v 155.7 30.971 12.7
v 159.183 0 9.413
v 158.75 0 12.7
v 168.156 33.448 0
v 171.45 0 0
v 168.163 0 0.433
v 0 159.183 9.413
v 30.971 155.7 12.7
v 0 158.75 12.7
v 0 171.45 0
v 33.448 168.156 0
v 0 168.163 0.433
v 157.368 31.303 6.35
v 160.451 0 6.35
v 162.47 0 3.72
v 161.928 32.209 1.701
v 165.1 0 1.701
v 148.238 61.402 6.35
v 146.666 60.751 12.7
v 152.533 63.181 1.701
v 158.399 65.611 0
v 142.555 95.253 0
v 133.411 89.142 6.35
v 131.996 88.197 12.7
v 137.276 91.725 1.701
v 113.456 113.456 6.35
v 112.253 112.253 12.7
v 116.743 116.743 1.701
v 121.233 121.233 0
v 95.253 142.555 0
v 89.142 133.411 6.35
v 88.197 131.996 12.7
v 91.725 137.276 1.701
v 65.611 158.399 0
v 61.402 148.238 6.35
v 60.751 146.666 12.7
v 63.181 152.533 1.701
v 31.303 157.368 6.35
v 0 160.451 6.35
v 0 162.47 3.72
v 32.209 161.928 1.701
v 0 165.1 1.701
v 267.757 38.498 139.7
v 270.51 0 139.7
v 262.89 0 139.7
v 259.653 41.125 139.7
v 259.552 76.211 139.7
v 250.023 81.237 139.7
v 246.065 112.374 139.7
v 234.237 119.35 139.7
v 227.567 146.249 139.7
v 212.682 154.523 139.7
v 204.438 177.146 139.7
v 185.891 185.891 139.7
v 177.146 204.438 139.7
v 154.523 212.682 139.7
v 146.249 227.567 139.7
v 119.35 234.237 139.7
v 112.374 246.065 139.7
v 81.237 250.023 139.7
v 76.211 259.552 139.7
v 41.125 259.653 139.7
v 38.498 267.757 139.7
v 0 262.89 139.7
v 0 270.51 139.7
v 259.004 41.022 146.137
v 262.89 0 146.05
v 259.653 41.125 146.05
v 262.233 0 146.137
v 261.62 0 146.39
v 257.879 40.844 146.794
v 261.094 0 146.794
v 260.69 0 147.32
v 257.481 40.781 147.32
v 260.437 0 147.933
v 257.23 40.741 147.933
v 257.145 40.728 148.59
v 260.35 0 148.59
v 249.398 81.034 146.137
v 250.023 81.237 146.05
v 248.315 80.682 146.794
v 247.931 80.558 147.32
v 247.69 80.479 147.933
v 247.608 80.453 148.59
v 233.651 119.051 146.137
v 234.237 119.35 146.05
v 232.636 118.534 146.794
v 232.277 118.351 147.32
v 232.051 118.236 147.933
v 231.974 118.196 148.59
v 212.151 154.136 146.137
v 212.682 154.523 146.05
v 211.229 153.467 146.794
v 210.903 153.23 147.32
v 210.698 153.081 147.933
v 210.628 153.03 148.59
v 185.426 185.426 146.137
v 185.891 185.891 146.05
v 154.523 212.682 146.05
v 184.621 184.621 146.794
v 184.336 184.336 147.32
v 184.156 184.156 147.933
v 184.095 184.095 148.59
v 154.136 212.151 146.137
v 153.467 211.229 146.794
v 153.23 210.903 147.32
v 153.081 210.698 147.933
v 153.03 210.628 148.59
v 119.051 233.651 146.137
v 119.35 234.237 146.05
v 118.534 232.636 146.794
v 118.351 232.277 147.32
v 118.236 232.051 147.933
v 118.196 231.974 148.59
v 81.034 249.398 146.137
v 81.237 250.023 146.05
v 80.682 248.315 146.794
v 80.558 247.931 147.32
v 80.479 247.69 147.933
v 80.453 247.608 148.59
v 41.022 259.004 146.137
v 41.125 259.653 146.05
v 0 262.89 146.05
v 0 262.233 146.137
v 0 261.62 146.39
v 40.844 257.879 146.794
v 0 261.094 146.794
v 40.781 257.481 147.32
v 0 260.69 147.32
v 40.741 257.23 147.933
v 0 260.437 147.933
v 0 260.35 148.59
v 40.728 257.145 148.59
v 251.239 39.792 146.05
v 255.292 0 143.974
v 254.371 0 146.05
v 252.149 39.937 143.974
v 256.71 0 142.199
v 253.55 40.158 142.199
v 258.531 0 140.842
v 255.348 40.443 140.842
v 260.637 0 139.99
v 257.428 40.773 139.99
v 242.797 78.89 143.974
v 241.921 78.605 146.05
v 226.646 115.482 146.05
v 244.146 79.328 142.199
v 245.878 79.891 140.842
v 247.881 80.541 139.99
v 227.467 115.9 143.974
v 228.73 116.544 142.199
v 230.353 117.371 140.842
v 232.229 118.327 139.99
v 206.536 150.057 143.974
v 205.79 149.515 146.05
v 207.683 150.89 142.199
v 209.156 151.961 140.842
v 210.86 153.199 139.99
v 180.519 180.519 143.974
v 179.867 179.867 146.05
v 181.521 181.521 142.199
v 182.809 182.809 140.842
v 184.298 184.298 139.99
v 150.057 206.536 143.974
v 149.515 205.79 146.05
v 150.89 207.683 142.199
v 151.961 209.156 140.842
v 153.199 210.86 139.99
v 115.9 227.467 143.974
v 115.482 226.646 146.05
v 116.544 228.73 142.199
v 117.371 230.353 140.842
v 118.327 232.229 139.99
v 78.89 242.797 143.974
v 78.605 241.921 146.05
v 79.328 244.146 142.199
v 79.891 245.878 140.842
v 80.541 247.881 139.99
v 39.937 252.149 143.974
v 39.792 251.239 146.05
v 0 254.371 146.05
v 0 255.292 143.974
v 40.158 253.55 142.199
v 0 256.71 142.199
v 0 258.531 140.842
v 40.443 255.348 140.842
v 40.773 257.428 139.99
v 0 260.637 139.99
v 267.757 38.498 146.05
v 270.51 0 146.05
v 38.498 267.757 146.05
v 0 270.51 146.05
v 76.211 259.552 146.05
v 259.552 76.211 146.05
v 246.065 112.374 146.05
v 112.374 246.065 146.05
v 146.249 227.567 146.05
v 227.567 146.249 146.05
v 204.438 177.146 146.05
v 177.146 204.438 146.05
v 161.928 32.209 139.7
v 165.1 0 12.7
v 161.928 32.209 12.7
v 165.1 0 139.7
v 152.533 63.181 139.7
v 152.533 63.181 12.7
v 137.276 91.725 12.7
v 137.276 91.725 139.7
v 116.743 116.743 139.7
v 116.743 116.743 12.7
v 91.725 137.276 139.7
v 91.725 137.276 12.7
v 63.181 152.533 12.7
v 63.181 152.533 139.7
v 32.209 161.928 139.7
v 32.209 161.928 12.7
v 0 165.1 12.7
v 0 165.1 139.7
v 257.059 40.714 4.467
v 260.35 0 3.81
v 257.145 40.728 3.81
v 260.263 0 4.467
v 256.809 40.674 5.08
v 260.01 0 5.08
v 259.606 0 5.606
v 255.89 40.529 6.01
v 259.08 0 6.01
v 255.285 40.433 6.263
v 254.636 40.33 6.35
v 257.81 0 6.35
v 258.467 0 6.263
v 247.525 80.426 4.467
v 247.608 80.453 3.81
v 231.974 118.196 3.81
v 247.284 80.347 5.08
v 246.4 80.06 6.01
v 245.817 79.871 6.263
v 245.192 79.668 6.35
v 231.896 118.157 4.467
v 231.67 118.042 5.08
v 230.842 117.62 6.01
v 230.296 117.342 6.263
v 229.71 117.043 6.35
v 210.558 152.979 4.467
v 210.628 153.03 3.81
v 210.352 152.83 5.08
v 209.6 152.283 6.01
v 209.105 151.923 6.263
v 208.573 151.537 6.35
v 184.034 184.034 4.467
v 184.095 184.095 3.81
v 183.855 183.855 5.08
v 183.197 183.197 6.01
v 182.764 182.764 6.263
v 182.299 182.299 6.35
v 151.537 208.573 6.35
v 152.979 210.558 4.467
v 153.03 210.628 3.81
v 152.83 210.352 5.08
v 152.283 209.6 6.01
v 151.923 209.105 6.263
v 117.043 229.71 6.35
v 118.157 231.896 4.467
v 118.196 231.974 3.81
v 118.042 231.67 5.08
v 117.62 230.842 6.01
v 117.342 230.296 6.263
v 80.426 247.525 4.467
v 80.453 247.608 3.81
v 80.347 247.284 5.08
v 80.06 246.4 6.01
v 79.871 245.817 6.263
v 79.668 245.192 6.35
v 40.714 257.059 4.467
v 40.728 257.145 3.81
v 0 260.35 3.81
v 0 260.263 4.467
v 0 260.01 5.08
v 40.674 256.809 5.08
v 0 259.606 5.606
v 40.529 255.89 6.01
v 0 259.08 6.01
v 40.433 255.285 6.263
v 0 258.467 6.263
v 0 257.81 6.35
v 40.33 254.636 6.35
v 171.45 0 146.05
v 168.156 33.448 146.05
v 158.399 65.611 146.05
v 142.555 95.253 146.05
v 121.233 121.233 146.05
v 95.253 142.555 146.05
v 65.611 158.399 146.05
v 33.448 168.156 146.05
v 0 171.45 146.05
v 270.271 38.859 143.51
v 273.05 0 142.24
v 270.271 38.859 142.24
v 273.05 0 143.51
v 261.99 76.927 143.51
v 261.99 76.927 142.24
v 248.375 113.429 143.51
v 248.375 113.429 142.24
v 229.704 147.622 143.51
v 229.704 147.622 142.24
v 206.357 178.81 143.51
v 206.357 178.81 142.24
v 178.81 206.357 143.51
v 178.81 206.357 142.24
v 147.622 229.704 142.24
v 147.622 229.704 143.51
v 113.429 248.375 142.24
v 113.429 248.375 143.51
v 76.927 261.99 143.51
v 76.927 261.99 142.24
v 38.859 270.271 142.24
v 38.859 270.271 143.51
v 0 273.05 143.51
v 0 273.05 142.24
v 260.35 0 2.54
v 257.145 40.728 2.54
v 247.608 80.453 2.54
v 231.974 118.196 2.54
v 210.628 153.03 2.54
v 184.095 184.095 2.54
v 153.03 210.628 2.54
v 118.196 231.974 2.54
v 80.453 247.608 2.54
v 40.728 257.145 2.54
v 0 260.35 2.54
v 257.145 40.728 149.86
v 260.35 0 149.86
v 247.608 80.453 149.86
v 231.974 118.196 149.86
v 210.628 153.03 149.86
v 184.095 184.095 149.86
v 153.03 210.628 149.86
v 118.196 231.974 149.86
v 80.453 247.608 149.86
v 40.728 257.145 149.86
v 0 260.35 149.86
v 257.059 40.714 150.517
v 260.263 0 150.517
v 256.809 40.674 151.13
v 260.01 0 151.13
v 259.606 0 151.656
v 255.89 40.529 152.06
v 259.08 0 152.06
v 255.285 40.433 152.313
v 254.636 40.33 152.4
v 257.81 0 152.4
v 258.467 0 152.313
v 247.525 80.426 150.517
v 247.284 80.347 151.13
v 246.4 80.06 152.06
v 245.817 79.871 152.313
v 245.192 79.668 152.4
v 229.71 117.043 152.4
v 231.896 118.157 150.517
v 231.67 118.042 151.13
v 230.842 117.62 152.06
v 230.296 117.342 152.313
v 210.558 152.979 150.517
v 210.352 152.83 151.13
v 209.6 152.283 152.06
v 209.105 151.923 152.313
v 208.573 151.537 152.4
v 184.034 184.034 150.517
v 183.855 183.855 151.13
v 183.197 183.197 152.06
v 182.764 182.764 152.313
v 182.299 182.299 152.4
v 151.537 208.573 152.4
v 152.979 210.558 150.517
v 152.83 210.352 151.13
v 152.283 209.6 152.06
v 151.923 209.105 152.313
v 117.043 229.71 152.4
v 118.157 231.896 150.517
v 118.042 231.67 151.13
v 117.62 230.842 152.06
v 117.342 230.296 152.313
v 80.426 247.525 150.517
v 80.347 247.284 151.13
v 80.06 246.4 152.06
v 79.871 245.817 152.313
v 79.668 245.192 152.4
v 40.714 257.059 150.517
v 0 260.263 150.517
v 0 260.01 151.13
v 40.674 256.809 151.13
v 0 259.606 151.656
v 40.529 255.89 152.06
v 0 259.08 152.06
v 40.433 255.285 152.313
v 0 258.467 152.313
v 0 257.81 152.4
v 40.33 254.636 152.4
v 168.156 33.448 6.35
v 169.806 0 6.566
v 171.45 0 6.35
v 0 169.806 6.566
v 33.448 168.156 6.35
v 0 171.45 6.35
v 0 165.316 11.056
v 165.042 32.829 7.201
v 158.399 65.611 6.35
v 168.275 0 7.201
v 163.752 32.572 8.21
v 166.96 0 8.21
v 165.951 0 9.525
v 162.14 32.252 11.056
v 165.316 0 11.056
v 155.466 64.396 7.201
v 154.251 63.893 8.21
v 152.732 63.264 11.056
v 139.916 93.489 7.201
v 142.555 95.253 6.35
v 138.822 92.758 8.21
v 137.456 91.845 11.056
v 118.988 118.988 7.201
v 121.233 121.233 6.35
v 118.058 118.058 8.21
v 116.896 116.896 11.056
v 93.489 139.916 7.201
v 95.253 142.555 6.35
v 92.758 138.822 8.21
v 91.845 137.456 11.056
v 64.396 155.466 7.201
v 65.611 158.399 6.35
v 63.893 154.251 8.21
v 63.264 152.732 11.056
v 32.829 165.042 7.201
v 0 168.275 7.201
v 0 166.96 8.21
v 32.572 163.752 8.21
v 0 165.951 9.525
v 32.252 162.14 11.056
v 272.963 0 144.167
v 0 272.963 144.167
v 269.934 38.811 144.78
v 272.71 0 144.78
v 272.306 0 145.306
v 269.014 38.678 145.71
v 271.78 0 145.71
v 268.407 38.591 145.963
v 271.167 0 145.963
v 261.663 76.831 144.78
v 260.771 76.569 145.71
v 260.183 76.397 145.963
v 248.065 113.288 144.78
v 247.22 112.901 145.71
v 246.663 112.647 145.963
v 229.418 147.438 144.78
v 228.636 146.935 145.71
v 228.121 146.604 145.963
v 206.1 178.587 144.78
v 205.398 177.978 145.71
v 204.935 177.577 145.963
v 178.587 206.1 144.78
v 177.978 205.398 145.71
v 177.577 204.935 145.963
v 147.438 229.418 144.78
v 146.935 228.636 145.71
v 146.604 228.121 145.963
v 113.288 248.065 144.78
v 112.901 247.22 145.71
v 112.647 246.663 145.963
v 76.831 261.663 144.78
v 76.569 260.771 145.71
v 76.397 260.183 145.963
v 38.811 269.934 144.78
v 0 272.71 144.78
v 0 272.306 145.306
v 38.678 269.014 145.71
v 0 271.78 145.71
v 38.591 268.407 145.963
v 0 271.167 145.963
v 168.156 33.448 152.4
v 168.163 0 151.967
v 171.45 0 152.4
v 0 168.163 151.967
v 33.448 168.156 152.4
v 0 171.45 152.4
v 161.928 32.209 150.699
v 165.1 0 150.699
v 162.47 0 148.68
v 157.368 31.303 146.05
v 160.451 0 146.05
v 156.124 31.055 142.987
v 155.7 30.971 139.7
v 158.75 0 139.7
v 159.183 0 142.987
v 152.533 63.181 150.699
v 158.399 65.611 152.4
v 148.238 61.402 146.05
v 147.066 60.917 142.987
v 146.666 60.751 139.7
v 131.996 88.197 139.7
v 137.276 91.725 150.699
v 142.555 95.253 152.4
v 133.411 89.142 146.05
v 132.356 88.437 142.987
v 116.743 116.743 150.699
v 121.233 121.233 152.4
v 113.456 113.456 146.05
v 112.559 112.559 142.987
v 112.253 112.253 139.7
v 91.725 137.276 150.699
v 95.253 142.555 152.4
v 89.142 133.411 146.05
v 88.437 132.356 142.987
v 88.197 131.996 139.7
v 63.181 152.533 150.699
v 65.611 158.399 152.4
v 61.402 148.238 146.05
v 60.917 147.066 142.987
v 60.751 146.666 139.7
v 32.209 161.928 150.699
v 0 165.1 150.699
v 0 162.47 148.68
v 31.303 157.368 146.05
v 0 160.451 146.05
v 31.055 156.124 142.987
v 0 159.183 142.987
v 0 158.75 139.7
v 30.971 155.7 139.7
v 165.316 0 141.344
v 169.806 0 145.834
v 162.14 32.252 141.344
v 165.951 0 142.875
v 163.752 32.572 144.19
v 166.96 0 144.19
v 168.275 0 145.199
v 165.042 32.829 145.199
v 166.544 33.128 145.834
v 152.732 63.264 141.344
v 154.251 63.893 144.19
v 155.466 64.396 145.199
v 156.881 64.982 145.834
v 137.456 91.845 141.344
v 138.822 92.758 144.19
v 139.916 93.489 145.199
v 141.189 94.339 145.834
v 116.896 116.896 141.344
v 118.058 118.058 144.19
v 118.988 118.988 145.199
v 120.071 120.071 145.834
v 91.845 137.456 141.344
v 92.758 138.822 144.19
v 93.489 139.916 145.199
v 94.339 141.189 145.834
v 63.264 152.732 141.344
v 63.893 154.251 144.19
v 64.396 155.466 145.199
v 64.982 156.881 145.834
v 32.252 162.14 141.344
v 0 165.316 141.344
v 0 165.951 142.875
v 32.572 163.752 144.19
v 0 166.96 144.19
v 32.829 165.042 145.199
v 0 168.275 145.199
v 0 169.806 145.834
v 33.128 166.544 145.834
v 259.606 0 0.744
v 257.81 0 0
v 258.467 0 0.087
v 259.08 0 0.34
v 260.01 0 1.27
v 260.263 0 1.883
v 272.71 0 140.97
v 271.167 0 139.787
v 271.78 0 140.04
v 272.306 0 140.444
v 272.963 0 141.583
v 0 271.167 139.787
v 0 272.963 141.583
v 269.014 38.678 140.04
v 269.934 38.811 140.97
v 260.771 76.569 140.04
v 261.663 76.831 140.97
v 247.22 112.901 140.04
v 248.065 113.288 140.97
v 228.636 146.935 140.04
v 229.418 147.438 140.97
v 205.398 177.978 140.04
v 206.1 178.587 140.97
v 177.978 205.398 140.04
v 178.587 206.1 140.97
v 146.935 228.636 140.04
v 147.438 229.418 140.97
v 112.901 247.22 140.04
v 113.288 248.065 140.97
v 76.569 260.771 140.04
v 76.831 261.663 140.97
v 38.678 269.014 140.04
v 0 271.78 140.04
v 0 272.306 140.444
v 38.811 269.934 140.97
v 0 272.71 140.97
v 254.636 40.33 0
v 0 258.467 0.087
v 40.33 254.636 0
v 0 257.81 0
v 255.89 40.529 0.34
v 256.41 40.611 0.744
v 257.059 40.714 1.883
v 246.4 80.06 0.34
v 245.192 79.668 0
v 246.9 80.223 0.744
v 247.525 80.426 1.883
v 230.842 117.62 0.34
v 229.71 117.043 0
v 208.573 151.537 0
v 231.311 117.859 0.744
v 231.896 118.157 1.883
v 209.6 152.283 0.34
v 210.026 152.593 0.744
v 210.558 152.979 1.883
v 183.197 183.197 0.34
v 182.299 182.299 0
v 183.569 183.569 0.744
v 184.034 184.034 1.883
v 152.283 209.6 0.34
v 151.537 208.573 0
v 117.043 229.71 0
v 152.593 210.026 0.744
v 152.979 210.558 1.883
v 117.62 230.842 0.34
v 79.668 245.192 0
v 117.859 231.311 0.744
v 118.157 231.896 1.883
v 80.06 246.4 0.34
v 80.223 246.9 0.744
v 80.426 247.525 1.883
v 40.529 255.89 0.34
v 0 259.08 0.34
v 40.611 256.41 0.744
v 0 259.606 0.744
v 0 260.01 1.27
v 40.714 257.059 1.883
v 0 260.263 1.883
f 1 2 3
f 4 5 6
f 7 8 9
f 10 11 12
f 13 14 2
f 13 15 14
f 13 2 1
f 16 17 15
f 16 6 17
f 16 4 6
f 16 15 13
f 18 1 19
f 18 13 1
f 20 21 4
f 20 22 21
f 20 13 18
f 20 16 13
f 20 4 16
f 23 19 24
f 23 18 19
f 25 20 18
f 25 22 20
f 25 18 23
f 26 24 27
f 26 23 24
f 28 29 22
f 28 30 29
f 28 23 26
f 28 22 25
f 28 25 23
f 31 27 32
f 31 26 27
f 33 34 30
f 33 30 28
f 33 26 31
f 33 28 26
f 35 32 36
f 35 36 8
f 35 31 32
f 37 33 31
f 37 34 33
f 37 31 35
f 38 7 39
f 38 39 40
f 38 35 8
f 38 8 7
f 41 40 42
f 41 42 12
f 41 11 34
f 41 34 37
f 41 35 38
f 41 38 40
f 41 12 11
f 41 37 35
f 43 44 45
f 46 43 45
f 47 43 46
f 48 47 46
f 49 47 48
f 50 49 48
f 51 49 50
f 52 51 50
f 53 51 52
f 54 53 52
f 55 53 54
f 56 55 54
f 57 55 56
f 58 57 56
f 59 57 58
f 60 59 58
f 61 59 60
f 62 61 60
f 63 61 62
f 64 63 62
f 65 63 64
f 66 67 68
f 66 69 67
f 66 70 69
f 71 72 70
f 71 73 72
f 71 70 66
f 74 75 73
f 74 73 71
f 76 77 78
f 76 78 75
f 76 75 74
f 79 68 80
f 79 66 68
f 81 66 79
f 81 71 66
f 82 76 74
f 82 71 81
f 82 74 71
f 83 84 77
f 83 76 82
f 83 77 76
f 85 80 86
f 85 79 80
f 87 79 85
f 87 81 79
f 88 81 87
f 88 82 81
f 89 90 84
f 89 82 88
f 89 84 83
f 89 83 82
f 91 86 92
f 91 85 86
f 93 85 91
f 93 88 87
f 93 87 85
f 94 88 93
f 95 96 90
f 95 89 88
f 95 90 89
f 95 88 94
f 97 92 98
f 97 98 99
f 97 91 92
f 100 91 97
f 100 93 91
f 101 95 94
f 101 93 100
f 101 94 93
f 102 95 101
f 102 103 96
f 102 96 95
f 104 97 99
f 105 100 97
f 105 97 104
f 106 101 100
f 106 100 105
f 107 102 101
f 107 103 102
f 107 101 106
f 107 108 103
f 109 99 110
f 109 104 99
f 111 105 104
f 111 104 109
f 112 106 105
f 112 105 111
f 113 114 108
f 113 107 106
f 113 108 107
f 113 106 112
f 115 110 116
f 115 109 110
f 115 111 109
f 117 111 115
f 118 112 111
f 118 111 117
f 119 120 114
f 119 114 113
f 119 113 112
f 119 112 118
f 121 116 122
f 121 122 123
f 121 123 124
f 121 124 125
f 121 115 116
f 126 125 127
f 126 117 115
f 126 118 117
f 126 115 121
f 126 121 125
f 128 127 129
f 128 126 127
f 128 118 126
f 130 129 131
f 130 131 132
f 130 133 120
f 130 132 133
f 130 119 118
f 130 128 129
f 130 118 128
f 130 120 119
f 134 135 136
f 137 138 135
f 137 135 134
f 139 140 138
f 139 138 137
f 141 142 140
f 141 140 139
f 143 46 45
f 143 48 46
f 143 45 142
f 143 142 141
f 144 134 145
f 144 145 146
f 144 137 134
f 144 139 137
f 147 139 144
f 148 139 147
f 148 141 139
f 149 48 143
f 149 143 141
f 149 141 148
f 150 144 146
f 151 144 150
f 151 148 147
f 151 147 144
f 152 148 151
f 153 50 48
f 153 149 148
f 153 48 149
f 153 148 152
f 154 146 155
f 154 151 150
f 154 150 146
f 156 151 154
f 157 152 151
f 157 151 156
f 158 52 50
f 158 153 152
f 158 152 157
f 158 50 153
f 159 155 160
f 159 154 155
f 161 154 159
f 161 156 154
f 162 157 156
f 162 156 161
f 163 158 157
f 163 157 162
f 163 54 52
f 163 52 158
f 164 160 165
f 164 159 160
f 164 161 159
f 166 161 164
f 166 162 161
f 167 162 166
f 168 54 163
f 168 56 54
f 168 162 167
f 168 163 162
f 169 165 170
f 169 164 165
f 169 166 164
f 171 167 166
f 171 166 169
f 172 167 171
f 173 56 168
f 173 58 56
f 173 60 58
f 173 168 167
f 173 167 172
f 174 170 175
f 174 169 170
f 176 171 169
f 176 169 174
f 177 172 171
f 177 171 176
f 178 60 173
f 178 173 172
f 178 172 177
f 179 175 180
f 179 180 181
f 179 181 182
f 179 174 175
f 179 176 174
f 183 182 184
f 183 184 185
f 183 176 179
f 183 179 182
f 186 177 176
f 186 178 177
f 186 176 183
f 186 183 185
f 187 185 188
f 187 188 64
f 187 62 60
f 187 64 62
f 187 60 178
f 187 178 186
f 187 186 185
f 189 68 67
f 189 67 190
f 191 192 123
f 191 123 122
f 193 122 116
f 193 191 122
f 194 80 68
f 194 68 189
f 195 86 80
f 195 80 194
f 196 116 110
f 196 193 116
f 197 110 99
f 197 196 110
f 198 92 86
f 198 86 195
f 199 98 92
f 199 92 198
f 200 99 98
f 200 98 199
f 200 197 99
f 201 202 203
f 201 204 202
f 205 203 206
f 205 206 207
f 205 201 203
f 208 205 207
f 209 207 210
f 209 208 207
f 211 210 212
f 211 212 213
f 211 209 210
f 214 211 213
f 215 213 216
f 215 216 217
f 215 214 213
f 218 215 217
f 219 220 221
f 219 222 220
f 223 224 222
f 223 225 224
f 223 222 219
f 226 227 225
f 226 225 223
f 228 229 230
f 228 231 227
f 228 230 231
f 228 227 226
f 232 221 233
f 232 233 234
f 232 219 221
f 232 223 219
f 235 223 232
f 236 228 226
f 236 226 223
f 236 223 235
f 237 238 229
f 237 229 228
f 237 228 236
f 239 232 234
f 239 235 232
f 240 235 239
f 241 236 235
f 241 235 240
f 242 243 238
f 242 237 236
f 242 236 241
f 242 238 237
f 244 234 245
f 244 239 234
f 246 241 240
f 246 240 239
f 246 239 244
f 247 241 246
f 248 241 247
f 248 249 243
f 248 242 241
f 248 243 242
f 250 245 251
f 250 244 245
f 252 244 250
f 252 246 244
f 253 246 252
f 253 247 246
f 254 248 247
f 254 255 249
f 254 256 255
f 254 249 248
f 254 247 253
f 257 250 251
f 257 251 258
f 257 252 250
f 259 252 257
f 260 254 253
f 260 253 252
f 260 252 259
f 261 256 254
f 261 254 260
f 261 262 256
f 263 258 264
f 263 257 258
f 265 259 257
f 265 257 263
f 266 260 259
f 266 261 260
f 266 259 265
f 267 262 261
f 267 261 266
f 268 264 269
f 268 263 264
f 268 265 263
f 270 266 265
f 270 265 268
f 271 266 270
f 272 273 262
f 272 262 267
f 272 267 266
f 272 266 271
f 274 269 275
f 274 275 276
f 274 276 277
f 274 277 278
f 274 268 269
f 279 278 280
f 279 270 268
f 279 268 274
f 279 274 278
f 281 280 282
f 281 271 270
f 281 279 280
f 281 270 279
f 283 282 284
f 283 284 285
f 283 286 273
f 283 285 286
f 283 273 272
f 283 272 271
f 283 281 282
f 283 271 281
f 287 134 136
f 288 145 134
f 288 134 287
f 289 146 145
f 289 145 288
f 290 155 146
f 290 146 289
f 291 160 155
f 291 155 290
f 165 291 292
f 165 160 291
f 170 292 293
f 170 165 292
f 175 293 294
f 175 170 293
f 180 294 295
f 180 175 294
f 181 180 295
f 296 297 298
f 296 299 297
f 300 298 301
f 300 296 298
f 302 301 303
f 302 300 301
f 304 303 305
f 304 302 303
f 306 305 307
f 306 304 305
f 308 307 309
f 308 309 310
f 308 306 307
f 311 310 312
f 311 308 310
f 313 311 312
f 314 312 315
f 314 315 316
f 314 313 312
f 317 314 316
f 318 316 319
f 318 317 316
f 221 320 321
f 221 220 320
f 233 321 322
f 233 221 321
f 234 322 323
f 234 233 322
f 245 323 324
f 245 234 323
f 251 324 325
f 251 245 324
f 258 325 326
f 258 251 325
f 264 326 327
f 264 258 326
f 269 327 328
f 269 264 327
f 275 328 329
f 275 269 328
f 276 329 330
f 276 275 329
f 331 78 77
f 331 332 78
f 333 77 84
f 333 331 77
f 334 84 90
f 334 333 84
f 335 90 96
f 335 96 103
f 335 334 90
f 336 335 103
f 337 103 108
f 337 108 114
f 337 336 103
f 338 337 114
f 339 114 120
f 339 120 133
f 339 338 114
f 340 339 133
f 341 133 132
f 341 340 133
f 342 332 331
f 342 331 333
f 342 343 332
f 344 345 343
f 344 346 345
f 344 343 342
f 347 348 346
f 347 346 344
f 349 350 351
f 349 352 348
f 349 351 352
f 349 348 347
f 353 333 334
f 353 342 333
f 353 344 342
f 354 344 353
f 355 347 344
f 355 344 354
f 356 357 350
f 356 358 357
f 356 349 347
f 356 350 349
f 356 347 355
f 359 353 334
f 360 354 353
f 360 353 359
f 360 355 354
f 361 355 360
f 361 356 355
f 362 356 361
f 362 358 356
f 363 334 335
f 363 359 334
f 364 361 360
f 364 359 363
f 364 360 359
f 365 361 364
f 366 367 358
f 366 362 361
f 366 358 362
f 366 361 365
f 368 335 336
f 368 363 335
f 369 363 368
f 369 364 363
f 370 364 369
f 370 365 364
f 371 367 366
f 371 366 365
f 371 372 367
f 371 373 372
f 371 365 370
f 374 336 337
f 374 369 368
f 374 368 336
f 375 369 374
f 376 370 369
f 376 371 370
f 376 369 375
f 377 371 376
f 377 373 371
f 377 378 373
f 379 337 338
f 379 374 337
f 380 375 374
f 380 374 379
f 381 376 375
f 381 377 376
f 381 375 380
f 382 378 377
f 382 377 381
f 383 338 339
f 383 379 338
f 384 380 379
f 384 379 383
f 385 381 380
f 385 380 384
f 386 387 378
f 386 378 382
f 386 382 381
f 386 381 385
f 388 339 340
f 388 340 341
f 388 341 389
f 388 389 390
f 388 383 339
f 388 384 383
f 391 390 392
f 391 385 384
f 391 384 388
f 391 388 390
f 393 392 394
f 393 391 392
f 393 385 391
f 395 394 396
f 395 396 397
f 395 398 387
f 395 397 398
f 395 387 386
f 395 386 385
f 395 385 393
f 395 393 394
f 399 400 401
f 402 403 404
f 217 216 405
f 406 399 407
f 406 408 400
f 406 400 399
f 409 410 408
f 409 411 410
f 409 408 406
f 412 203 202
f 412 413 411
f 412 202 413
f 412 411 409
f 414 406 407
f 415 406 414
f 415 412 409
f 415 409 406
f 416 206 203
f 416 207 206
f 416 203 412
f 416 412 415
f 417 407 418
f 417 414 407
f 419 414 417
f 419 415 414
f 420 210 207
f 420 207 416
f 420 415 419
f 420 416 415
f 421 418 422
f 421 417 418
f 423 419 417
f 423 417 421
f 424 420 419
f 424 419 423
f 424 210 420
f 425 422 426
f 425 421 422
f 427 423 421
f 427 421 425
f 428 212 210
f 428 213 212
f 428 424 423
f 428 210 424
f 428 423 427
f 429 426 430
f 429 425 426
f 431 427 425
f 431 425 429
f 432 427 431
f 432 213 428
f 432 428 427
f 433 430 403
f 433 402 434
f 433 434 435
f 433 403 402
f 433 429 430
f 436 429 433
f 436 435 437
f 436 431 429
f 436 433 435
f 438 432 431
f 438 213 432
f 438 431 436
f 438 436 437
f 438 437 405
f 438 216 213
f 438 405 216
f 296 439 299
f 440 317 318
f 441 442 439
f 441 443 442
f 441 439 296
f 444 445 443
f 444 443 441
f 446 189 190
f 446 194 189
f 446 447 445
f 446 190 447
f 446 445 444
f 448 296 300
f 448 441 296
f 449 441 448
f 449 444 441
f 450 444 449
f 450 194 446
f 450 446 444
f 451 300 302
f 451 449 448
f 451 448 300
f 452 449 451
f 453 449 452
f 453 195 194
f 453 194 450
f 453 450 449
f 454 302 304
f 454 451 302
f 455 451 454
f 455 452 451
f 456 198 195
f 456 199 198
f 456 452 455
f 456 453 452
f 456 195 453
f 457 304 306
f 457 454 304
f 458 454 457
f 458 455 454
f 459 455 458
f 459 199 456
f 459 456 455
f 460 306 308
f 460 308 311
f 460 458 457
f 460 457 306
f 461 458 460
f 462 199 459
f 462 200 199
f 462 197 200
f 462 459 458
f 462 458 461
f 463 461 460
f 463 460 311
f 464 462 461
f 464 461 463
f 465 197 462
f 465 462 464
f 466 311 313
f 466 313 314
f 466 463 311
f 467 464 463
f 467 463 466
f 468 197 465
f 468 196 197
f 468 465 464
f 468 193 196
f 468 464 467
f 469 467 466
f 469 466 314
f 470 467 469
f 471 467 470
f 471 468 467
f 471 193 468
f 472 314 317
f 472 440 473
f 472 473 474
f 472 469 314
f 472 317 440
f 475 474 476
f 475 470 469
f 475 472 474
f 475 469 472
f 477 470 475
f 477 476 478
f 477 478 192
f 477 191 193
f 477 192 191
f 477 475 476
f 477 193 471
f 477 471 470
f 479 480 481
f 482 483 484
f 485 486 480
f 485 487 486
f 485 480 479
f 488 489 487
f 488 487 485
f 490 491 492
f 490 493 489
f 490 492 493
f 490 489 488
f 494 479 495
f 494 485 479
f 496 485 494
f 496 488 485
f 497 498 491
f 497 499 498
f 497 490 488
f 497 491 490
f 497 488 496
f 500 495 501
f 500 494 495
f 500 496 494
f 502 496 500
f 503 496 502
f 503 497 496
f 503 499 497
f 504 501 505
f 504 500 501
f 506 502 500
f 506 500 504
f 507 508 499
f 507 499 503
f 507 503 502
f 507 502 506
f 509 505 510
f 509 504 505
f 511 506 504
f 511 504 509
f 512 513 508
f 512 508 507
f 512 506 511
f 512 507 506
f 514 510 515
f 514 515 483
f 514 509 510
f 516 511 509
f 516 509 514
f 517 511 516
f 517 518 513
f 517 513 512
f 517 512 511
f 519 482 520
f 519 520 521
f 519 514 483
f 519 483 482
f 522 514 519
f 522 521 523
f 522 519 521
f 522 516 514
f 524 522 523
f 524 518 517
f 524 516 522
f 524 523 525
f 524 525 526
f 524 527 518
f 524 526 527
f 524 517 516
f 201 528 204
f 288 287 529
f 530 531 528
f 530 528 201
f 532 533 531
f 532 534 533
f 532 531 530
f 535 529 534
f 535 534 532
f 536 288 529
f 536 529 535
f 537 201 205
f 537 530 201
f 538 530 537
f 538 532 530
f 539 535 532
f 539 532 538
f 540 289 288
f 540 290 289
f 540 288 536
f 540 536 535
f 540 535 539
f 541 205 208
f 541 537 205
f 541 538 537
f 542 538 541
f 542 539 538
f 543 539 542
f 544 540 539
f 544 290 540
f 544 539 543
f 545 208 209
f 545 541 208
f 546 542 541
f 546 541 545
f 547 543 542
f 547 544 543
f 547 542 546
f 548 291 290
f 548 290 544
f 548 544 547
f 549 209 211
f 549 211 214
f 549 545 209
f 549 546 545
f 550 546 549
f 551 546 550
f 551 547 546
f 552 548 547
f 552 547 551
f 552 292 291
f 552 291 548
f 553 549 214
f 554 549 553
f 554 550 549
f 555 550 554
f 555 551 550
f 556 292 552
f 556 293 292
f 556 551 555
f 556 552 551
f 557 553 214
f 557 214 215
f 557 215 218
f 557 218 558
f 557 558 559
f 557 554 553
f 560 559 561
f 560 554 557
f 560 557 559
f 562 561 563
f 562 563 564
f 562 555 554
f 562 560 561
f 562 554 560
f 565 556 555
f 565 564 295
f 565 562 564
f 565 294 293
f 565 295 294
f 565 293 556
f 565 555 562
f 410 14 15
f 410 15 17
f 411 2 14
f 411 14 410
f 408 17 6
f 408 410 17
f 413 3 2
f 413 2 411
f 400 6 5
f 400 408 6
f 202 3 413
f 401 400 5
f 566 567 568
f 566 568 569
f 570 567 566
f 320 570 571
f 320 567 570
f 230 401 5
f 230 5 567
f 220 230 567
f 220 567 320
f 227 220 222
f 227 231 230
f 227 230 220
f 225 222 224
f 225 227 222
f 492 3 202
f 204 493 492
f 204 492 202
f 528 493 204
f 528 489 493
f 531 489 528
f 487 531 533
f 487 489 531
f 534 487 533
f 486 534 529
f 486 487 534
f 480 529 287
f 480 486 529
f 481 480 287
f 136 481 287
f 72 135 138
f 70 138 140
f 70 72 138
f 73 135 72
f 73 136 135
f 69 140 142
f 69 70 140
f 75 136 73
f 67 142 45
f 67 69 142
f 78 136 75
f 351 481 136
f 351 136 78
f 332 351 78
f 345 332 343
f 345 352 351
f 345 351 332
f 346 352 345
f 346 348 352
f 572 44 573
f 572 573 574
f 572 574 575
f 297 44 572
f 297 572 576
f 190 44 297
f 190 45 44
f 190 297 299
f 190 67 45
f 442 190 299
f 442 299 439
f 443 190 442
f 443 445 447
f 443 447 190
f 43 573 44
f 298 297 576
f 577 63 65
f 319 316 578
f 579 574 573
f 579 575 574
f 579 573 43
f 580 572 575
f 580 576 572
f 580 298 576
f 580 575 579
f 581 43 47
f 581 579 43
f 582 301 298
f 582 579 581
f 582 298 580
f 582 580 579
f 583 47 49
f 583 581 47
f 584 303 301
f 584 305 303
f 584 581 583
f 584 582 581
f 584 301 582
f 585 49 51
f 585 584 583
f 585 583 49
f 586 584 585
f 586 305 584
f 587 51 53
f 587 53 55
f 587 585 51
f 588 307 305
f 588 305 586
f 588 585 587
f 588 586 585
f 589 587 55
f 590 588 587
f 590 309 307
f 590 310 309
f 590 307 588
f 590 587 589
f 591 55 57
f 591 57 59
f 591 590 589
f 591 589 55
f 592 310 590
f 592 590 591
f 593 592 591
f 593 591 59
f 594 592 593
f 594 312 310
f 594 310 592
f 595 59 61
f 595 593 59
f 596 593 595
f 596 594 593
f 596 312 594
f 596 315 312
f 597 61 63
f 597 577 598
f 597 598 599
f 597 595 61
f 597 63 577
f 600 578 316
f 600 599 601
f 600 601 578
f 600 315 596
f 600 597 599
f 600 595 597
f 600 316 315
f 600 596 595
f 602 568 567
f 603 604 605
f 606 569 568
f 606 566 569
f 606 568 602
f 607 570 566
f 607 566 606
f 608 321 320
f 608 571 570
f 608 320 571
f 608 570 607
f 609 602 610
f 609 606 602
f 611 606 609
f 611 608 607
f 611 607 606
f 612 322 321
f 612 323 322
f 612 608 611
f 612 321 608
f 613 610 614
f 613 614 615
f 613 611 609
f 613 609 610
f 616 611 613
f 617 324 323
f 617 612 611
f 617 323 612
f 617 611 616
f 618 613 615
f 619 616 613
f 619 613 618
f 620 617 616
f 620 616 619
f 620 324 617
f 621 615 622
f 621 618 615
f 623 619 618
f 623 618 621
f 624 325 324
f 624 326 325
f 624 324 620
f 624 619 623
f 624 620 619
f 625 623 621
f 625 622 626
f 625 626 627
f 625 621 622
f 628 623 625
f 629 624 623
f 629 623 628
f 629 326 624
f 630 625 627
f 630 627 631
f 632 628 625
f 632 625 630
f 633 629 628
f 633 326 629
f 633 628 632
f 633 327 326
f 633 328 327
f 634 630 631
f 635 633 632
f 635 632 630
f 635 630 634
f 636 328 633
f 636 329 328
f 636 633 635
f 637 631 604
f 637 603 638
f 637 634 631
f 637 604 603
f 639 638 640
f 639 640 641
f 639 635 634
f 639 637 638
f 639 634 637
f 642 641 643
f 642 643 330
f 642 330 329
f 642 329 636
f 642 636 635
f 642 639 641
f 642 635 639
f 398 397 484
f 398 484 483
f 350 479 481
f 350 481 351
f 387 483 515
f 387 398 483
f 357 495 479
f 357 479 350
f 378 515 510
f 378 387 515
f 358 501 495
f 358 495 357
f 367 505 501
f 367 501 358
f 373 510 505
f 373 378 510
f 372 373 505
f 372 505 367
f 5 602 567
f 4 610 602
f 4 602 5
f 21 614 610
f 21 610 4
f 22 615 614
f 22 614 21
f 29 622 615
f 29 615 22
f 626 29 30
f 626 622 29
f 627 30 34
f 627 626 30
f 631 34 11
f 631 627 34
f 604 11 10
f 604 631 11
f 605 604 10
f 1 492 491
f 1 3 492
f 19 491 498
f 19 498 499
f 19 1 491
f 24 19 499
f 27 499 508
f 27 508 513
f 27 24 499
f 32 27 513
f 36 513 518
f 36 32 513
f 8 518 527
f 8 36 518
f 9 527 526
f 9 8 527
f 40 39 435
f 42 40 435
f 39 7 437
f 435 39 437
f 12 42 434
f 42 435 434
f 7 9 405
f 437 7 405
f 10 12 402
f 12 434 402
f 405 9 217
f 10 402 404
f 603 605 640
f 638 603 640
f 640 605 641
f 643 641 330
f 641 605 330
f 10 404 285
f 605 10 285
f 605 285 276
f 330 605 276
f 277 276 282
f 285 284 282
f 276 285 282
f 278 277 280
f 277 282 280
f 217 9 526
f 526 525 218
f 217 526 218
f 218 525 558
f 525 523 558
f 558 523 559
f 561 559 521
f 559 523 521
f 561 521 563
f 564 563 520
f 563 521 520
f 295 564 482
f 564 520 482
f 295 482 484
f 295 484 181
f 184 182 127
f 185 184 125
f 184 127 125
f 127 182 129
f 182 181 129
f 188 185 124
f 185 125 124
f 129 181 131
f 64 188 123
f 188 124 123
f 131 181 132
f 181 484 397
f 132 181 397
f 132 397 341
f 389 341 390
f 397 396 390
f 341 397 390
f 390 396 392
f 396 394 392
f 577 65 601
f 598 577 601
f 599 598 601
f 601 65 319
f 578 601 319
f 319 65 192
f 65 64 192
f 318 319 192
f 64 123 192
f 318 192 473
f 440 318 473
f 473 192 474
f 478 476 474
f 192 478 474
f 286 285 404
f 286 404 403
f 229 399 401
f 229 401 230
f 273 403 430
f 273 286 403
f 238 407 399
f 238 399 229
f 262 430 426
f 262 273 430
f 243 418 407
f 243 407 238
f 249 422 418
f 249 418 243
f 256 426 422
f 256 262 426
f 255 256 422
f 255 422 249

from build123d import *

# Parameters (mm, degrees)
F1_ANGLE = 90


# Not quite as in the source:
# - ends of sketch curves that miss each other by under 0.0002 mm in the source are joined


with BuildPart() as f1:
    # F0 (on Front) → F1 (revolve)
    with BuildSketch(Plane.XZ):
        with BuildLine():
            Line((158.75, 139.7), (158.75, 12.7))
            ThreePointArc((158.75, 12.7), (162.4697438789, 3.7197438789), (171.45, 0))
            Line((171.45, 0), (257.81, 0))
            ThreePointArc((257.81, 0), (259.6060512242, 0.7439487758), (260.35, 2.54))
            Line((260.35, 2.54), (260.35, 3.8099999233))
            ThreePointArc((260.35, 3.8099999233), (259.6060512242, 5.6060511475), (257.81, 6.3499999233))
            Line((257.81, 6.3499999233), (171.45, 6.3499999233))
            ThreePointArc((171.45, 6.3499999233), (166.9598694704, 8.2098694704), (165.0999965083, 12.7))
            Line((165.0999965083, 12.7), (165.1, 139.7))
            ThreePointArc((165.1, 139.7), (166.9598719395, 144.1901280605), (171.45, 146.05))
            Line((171.45, 146.05), (254.3705810057, 146.05))
            ThreePointArc((254.3705810057, 146.05), (257.5772088315, 141.4621426782), (262.89, 139.7))
            Line((262.89, 139.7), (270.51, 139.7))
            ThreePointArc((270.51, 139.7), (272.3060512242, 140.4439487758), (273.05, 142.24))
            Line((273.05, 142.24), (273.05, 143.51))
            ThreePointArc((273.05, 143.51), (272.3060512242, 145.3060512242), (270.51, 146.05))
            Line((270.51, 146.05), (262.89, 146.05))
            ThreePointArc((262.89, 146.05), (261.0939487758, 146.7939487758), (260.35, 148.59))
            Line((260.35, 148.59), (260.35, 149.86))
            ThreePointArc((260.35, 149.86), (259.6060512242, 151.6560512242), (257.81, 152.4))
            Line((257.81, 152.4), (171.45, 152.4))
            ThreePointArc((171.45, 152.4), (162.4697438789, 148.6802561211), (158.75, 139.7))
        make_face()
    revolve(axis=Axis((0, 0, 68.397693336), (0, 0, 1)), revolution_arc=F1_ANGLE)


solid = f1.part
